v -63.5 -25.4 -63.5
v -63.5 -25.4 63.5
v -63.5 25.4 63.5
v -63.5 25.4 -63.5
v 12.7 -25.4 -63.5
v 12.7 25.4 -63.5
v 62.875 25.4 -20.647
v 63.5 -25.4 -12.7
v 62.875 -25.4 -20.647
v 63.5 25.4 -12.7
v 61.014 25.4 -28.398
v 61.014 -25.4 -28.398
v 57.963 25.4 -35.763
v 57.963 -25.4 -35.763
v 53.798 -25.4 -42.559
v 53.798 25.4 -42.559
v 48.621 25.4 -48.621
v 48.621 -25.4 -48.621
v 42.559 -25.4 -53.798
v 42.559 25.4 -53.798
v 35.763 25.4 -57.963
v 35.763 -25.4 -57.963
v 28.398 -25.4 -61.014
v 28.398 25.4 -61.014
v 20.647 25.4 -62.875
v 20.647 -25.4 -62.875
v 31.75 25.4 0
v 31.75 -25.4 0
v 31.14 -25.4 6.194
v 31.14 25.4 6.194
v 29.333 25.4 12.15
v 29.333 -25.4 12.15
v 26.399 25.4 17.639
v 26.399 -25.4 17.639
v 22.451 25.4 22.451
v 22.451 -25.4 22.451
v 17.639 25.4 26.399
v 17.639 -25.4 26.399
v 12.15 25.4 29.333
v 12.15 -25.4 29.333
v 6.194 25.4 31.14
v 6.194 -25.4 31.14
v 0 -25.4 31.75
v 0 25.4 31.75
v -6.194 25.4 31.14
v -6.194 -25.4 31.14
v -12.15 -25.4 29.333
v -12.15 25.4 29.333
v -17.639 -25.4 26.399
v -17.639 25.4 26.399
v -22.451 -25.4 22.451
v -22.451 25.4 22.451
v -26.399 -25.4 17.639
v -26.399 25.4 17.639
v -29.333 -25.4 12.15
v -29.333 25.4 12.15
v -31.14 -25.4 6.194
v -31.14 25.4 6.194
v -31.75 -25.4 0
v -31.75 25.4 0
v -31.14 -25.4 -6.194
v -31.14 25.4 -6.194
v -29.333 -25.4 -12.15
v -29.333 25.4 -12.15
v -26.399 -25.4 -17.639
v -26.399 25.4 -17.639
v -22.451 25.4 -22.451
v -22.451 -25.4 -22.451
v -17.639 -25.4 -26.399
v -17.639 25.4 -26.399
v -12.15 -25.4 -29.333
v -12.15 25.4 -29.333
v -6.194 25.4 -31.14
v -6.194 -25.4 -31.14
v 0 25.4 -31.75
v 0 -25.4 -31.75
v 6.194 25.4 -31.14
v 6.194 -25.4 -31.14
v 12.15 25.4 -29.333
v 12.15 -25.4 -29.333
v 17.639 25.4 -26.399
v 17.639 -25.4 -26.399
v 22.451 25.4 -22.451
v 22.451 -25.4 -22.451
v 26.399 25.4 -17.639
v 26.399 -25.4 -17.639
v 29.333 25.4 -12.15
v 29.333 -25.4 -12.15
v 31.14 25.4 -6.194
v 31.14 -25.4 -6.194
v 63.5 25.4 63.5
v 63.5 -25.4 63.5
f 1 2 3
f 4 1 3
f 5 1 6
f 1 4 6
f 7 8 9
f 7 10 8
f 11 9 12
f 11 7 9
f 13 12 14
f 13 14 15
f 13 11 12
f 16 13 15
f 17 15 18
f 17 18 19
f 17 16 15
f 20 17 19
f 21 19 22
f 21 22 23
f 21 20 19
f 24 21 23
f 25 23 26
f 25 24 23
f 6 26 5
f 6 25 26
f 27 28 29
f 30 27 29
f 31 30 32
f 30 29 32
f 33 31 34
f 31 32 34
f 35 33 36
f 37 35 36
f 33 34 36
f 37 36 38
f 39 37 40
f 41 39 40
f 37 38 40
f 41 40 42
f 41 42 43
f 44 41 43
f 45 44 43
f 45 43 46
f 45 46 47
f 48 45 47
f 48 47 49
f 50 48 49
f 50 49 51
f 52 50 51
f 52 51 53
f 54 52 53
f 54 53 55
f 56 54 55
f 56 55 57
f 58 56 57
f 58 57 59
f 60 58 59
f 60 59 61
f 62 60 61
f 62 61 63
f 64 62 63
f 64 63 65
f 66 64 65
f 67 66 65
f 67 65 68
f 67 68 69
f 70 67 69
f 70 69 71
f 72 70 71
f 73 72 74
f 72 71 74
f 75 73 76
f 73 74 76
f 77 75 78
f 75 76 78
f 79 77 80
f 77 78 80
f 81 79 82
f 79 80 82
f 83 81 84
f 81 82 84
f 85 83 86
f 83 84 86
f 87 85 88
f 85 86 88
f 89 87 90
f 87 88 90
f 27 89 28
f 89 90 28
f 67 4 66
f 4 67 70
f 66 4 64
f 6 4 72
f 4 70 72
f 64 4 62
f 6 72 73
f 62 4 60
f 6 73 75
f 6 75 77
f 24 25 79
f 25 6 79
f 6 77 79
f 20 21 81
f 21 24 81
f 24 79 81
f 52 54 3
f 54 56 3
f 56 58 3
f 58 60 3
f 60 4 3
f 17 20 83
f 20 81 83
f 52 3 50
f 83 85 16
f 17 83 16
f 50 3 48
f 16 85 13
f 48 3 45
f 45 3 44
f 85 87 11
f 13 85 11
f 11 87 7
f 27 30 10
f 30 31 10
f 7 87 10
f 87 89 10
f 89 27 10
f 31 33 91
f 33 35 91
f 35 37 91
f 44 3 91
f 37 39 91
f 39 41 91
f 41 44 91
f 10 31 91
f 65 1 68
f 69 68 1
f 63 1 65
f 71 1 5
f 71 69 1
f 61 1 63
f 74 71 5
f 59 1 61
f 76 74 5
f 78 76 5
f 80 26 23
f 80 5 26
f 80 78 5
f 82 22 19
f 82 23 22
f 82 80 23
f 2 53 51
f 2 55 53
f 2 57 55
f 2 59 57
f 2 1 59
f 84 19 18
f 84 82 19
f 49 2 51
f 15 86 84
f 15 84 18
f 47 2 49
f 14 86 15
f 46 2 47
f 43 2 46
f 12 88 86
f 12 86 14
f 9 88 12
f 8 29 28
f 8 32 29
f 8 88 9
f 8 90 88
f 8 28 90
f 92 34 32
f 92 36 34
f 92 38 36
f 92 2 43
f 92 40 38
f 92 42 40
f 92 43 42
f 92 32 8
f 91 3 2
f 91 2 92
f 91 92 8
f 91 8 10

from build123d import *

# Parameters (mm, degrees)
F0_W     = 127
F0_H     = 50.8
F1_DEPTH = 63.5
F2_R     = 50.8
F3_R     = 31.75
F4_DEPTH = 50.801


with BuildPart() as f1:
    # F0 (on Top) → F1 (new body, symmetric)
    with BuildSketch(Plane.XY):
        Rectangle(F0_W, F0_H)
    extrude(amount=F1_DEPTH, both=True)

    # F2
    f2_edges = [f1.edges().sort_by_distance(p)[0] for p in [
        (63.5, 0, -63.5),
    ]]
    fillet(f2_edges, radius=F2_R)

    # F3 (on face) → F4 (cut, through all)
    with BuildSketch(Plane.XZ.offset(25.4)):
        Circle(F3_R)
    extrude(amount=-F4_DEPTH, mode=Mode.SUBTRACT)


solid = f1.part
